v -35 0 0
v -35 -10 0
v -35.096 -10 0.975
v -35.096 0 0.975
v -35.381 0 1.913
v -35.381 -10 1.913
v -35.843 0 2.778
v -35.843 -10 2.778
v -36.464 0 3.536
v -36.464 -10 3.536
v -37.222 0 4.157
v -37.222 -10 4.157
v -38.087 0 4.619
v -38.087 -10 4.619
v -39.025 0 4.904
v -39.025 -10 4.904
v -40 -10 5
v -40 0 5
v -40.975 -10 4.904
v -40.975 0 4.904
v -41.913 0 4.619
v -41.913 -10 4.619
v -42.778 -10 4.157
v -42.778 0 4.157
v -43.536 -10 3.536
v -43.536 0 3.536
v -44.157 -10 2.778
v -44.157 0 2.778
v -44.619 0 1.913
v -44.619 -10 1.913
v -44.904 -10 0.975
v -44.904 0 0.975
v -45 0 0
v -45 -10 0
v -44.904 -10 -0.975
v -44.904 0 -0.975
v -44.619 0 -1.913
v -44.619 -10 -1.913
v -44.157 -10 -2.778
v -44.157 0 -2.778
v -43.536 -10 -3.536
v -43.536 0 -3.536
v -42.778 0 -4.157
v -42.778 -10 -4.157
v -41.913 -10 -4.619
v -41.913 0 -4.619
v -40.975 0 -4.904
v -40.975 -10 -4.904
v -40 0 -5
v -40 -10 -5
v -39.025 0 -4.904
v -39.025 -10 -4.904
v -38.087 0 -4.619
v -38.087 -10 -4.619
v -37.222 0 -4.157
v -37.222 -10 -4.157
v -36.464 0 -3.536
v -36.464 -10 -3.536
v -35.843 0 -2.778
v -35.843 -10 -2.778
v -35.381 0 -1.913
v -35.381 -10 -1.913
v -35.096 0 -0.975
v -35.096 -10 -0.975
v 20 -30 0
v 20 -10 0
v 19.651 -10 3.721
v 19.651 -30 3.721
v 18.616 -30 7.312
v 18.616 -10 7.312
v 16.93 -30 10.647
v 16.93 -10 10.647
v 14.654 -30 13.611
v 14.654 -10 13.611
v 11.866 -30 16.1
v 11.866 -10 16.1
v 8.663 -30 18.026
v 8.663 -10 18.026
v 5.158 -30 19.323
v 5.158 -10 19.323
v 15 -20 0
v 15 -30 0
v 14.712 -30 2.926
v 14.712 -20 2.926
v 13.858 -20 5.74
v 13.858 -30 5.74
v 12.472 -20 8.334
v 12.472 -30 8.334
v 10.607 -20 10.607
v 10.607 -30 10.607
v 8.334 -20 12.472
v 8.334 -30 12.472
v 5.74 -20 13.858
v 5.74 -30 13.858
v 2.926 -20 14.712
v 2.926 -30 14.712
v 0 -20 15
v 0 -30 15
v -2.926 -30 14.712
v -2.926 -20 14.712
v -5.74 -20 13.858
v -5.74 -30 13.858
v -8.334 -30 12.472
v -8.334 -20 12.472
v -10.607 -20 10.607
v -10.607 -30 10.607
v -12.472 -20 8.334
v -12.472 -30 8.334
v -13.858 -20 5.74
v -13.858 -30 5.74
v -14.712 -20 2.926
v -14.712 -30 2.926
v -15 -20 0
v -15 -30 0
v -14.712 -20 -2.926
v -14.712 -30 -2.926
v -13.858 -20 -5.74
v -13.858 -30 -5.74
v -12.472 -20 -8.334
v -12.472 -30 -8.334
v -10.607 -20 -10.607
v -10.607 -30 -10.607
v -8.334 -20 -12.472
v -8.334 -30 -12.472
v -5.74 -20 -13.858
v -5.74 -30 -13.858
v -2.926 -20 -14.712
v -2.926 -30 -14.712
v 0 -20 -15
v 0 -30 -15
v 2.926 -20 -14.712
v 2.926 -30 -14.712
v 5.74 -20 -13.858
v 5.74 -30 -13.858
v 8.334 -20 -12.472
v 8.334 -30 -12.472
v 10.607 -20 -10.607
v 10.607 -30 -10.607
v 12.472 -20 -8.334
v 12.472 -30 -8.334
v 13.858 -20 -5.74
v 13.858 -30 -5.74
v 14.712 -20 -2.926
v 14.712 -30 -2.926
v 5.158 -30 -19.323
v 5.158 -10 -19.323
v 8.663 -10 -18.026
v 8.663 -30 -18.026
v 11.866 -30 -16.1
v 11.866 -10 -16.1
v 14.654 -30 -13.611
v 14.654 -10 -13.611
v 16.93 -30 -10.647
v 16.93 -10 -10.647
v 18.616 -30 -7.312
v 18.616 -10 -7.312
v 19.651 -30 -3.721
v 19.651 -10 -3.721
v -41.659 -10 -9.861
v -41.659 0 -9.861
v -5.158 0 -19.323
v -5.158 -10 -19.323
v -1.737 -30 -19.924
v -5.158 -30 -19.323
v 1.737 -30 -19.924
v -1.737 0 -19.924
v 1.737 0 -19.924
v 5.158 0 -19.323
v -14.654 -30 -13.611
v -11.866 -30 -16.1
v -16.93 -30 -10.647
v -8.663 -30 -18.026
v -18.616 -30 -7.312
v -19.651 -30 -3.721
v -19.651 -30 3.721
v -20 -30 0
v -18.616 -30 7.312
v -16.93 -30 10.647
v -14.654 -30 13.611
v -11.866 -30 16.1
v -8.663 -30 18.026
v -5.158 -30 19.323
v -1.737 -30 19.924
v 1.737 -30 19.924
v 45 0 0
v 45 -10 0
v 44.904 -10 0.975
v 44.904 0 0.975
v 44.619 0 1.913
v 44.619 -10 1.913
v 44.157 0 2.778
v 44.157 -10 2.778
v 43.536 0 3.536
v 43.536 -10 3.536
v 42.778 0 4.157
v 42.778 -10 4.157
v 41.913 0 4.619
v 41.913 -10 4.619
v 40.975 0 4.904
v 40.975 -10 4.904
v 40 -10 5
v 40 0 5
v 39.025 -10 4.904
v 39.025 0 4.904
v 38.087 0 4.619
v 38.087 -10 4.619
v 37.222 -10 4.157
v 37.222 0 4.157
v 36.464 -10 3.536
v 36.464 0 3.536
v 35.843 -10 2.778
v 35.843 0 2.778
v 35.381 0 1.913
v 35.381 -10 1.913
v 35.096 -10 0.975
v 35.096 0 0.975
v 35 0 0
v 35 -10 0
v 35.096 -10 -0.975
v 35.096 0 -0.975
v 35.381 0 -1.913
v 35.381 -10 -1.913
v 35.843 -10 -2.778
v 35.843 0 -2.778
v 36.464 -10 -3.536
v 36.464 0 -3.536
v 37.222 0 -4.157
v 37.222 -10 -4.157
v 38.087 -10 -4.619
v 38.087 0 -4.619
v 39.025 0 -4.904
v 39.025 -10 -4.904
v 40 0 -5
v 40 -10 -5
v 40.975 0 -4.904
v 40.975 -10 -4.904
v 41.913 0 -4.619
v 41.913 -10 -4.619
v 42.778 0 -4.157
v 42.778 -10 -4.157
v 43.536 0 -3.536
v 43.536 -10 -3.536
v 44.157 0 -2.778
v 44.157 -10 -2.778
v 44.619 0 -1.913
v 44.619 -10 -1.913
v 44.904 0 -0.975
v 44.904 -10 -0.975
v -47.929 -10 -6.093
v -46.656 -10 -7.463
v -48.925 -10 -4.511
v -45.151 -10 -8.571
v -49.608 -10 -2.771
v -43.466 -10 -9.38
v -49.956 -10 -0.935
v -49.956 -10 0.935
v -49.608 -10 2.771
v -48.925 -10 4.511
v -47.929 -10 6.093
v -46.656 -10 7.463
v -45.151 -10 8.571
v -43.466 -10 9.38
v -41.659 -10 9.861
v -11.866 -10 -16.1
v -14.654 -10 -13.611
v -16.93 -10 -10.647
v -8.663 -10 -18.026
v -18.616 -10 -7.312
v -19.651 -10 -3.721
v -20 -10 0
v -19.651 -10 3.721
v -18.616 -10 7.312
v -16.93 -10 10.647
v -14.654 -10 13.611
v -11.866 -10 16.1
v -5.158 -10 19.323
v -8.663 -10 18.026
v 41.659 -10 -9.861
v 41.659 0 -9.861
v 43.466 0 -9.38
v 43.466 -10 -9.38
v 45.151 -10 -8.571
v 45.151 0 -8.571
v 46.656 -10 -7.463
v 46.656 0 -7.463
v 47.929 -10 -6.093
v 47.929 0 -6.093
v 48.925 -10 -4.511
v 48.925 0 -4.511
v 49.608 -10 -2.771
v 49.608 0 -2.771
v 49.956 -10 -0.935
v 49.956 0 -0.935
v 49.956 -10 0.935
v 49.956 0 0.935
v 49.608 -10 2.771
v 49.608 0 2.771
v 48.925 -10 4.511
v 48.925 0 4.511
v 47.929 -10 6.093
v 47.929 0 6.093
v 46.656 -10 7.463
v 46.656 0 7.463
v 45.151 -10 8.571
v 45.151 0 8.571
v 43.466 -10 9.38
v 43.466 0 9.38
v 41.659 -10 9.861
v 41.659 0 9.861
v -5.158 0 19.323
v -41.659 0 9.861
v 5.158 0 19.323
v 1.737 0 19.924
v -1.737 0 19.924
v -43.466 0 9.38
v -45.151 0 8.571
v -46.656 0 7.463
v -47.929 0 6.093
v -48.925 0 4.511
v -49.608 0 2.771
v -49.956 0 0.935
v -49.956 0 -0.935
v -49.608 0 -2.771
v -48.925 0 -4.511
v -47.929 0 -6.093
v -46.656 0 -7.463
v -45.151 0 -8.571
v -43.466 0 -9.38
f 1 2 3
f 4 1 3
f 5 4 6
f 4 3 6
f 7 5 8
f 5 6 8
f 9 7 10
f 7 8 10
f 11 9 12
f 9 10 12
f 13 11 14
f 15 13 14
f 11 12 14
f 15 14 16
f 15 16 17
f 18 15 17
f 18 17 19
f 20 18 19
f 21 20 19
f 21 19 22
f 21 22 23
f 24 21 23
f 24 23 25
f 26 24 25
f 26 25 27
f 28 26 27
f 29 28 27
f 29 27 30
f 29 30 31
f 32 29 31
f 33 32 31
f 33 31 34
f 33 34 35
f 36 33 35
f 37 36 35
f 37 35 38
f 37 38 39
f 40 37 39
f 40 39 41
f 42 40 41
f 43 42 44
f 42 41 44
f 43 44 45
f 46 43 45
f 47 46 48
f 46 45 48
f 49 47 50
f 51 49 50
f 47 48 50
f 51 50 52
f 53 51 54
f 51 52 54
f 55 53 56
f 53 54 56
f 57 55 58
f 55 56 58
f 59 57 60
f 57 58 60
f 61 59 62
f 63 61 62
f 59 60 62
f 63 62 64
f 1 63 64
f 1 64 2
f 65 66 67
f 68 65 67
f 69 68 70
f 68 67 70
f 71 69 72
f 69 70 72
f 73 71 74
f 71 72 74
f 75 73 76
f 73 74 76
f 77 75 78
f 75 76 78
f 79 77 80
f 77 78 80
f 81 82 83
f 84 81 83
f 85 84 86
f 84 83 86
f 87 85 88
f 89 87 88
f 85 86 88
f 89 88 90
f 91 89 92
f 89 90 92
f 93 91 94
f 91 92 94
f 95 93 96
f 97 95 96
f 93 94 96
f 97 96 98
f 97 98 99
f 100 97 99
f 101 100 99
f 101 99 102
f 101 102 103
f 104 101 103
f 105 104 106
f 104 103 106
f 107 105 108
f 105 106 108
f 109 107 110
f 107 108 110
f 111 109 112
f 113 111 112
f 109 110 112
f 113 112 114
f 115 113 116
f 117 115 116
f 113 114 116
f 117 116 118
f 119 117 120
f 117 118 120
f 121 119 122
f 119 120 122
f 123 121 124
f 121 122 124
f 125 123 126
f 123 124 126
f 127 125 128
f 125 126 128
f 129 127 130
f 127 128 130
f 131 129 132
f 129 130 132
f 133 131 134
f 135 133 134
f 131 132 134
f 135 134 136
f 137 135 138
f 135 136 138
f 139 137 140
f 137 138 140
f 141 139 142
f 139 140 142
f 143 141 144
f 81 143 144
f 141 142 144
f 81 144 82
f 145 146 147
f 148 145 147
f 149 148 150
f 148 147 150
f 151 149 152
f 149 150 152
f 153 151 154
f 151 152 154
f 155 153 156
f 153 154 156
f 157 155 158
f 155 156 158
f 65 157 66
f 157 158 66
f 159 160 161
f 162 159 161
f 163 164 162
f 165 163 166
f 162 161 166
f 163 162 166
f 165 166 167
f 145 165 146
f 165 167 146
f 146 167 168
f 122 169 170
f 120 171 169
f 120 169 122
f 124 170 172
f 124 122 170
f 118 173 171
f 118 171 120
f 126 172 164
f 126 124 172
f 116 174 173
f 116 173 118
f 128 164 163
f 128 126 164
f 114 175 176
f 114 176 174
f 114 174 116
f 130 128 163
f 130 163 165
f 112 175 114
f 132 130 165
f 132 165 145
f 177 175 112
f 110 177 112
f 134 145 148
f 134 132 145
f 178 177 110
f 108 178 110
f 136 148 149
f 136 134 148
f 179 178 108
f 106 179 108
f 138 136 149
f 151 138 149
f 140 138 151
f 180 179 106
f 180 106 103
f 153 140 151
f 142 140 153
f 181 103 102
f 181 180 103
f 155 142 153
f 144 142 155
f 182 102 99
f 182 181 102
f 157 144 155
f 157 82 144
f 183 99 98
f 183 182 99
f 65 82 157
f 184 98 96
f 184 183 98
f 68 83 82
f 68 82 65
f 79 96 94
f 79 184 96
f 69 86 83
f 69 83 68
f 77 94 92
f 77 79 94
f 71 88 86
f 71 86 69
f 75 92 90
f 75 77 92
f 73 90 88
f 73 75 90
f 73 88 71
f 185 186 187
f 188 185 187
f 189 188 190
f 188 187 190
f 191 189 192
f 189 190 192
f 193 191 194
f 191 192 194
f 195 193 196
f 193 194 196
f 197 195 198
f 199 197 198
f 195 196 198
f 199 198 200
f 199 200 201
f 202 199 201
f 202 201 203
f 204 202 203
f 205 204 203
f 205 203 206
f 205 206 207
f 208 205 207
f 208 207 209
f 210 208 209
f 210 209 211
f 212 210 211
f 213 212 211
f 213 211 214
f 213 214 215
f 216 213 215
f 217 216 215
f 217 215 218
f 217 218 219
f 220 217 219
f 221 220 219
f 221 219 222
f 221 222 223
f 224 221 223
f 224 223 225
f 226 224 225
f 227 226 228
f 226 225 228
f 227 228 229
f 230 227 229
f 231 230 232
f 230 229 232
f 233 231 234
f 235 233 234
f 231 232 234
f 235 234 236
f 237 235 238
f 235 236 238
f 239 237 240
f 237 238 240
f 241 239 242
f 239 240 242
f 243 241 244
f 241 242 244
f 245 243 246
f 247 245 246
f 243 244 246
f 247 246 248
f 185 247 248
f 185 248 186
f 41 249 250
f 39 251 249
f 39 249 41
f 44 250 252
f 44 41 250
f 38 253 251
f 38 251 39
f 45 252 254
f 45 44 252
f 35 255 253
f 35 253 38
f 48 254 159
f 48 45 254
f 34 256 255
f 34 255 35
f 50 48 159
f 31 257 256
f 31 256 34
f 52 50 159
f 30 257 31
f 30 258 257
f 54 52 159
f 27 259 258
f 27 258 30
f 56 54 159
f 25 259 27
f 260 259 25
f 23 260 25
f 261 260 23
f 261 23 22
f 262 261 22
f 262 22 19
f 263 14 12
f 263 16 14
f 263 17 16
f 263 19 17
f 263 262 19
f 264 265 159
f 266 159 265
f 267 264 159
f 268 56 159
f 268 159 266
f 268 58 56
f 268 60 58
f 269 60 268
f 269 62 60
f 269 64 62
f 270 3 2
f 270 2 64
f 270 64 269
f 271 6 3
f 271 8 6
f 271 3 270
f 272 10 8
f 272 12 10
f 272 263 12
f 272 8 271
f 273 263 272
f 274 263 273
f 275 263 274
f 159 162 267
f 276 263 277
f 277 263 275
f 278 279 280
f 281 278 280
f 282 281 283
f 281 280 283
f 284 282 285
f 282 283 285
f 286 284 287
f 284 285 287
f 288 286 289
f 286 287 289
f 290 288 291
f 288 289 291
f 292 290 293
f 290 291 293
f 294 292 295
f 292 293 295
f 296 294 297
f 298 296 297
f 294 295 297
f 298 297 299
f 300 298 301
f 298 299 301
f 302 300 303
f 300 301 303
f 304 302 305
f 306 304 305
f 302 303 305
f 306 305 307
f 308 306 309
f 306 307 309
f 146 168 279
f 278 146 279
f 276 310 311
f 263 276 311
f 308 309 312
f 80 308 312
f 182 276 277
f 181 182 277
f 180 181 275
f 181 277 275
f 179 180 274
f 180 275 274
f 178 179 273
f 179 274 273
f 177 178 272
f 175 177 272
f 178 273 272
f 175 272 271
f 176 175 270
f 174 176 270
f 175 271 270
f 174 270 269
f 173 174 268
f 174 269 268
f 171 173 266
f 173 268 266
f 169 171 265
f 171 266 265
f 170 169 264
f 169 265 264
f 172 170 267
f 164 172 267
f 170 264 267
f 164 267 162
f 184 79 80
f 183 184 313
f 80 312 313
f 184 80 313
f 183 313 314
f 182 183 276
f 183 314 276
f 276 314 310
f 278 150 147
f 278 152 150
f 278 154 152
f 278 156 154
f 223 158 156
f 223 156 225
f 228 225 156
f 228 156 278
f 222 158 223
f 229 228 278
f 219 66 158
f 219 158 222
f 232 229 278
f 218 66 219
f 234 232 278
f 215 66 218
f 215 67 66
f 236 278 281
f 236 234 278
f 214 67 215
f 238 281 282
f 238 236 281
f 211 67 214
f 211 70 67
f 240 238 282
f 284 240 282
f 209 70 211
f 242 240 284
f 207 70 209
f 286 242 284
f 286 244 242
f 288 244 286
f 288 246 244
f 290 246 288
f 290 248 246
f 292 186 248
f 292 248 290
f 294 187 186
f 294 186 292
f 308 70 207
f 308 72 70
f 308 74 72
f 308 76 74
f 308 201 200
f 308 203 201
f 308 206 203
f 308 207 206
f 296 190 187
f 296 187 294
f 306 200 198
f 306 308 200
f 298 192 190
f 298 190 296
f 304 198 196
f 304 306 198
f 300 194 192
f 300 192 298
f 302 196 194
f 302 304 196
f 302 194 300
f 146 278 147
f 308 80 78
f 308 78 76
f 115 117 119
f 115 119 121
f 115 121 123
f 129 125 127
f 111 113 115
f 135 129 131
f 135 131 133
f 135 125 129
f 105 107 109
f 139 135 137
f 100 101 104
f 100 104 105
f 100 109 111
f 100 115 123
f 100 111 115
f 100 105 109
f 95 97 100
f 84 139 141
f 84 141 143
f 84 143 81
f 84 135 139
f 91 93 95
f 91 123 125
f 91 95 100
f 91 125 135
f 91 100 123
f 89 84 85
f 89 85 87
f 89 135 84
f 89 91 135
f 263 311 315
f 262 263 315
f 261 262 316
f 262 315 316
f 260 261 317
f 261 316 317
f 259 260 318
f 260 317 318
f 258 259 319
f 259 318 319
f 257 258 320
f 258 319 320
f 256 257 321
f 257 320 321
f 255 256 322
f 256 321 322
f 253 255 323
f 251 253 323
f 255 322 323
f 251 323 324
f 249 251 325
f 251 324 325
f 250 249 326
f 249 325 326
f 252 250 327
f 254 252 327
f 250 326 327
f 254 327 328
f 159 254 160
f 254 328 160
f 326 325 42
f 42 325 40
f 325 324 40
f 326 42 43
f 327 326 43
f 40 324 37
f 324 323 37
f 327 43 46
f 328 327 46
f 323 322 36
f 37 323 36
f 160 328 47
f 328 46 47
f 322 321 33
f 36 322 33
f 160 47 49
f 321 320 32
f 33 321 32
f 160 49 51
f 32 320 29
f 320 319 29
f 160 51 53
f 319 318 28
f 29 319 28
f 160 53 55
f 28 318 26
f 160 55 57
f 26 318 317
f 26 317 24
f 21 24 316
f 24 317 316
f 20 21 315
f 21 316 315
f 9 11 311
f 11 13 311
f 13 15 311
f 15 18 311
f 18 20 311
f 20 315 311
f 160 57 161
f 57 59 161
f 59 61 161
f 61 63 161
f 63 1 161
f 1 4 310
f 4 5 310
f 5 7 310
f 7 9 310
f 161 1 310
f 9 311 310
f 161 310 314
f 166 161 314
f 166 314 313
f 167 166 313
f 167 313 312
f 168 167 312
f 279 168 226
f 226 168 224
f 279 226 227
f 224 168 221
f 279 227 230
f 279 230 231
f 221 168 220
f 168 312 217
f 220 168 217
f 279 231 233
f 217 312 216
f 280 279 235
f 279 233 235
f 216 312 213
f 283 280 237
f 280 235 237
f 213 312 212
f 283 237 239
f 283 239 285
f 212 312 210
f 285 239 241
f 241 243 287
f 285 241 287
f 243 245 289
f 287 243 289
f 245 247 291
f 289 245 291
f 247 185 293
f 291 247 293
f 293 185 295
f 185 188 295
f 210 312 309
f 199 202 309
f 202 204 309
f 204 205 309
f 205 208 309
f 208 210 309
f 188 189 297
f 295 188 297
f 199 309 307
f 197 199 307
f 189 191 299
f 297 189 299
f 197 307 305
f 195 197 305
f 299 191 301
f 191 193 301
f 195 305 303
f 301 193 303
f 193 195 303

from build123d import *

# Parameters (mm, degrees)
F1_DEPTH = 10
F2_R     = 5
F3_DEPTH = 10.001
F5_DEPTH = 20
F6_R     = 15
F7_DEPTH = 10


with BuildPart() as f1:
    # F0 (on Front) → F1 (new body)
    with BuildSketch(Plane.XZ):
        with BuildLine():
            Line((5.158226, -19.323372), (41.659475, -9.861346))
            ThreePointArc((41.659475, -9.861346), (50, 0), (41.659475, 9.861346))
            Line((41.659475, 9.861346), (5.158226, 19.323372))
            ThreePointArc((5.158226, 19.323372), (15.861345, 12.182682), (20, 0))
            ThreePointArc((20, 0), (15.861345, -12.182682), (5.158226, -19.323372))
        make_face()
        with BuildLine():
            ThreePointArc((-5.158226, -19.323372), (0, -20), (5.158226, -19.323372))
            ThreePointArc((5.158226, -19.323372), (15.861345, -12.182682), (20, 0))
            ThreePointArc((20, 0), (15.861345, 12.182682), (5.158226, 19.323372))
            ThreePointArc((5.158226, 19.323372), (0, 20), (-5.158226, 19.323372))
            ThreePointArc((-5.158226, 19.323372), (-20, 0), (-5.158226, -19.323372))
        make_face()
        with BuildLine():
            Line((-41.659475, -9.861346), (-5.158226, -19.323372))
            ThreePointArc((-5.158226, -19.323372), (-20, 0), (-5.158226, 19.323372))
            Line((-5.158226, 19.323372), (-41.659475, 9.861346))
            ThreePointArc((-41.659475, 9.861346), (-50, 0), (-41.659475, -9.861346))
        make_face()
    extrude(amount=F1_DEPTH)

    # F2 (on face) → F3 (cut, through all)
    with BuildSketch(Plane.XZ.offset(10)):
        with Locations((40, 0)):
            Circle(F2_R)
        with Locations((-40, 0)):
            Circle(F2_R)
    extrude(amount=-F3_DEPTH, mode=Mode.SUBTRACT)

    # F4 (on face) → F5 (join)
    with BuildSketch(Plane.XZ.offset(10)):
        with BuildLine():
            ThreePointArc((5.158226, -19.323372), (15.861345, -12.182682), (20, 0))
            ThreePointArc((20, 0), (15.861345, 12.182682), (5.158226, 19.323372))
            ThreePointArc((5.158226, 19.323372), (0, 20), (-5.158226, 19.323372))
            ThreePointArc((-5.158226, 19.323372), (-20, 0), (-5.158226, -19.323372))
            ThreePointArc((-5.158226, -19.323372), (0, -20), (5.158226, -19.323372))
        make_face()
    extrude(amount=F5_DEPTH)

    # F6 (on face) → F7 (cut)
    with BuildSketch(Plane.XZ.offset(30)):
        Circle(F6_R)
    extrude(amount=-F7_DEPTH, mode=Mode.SUBTRACT)


solid = f1.part
